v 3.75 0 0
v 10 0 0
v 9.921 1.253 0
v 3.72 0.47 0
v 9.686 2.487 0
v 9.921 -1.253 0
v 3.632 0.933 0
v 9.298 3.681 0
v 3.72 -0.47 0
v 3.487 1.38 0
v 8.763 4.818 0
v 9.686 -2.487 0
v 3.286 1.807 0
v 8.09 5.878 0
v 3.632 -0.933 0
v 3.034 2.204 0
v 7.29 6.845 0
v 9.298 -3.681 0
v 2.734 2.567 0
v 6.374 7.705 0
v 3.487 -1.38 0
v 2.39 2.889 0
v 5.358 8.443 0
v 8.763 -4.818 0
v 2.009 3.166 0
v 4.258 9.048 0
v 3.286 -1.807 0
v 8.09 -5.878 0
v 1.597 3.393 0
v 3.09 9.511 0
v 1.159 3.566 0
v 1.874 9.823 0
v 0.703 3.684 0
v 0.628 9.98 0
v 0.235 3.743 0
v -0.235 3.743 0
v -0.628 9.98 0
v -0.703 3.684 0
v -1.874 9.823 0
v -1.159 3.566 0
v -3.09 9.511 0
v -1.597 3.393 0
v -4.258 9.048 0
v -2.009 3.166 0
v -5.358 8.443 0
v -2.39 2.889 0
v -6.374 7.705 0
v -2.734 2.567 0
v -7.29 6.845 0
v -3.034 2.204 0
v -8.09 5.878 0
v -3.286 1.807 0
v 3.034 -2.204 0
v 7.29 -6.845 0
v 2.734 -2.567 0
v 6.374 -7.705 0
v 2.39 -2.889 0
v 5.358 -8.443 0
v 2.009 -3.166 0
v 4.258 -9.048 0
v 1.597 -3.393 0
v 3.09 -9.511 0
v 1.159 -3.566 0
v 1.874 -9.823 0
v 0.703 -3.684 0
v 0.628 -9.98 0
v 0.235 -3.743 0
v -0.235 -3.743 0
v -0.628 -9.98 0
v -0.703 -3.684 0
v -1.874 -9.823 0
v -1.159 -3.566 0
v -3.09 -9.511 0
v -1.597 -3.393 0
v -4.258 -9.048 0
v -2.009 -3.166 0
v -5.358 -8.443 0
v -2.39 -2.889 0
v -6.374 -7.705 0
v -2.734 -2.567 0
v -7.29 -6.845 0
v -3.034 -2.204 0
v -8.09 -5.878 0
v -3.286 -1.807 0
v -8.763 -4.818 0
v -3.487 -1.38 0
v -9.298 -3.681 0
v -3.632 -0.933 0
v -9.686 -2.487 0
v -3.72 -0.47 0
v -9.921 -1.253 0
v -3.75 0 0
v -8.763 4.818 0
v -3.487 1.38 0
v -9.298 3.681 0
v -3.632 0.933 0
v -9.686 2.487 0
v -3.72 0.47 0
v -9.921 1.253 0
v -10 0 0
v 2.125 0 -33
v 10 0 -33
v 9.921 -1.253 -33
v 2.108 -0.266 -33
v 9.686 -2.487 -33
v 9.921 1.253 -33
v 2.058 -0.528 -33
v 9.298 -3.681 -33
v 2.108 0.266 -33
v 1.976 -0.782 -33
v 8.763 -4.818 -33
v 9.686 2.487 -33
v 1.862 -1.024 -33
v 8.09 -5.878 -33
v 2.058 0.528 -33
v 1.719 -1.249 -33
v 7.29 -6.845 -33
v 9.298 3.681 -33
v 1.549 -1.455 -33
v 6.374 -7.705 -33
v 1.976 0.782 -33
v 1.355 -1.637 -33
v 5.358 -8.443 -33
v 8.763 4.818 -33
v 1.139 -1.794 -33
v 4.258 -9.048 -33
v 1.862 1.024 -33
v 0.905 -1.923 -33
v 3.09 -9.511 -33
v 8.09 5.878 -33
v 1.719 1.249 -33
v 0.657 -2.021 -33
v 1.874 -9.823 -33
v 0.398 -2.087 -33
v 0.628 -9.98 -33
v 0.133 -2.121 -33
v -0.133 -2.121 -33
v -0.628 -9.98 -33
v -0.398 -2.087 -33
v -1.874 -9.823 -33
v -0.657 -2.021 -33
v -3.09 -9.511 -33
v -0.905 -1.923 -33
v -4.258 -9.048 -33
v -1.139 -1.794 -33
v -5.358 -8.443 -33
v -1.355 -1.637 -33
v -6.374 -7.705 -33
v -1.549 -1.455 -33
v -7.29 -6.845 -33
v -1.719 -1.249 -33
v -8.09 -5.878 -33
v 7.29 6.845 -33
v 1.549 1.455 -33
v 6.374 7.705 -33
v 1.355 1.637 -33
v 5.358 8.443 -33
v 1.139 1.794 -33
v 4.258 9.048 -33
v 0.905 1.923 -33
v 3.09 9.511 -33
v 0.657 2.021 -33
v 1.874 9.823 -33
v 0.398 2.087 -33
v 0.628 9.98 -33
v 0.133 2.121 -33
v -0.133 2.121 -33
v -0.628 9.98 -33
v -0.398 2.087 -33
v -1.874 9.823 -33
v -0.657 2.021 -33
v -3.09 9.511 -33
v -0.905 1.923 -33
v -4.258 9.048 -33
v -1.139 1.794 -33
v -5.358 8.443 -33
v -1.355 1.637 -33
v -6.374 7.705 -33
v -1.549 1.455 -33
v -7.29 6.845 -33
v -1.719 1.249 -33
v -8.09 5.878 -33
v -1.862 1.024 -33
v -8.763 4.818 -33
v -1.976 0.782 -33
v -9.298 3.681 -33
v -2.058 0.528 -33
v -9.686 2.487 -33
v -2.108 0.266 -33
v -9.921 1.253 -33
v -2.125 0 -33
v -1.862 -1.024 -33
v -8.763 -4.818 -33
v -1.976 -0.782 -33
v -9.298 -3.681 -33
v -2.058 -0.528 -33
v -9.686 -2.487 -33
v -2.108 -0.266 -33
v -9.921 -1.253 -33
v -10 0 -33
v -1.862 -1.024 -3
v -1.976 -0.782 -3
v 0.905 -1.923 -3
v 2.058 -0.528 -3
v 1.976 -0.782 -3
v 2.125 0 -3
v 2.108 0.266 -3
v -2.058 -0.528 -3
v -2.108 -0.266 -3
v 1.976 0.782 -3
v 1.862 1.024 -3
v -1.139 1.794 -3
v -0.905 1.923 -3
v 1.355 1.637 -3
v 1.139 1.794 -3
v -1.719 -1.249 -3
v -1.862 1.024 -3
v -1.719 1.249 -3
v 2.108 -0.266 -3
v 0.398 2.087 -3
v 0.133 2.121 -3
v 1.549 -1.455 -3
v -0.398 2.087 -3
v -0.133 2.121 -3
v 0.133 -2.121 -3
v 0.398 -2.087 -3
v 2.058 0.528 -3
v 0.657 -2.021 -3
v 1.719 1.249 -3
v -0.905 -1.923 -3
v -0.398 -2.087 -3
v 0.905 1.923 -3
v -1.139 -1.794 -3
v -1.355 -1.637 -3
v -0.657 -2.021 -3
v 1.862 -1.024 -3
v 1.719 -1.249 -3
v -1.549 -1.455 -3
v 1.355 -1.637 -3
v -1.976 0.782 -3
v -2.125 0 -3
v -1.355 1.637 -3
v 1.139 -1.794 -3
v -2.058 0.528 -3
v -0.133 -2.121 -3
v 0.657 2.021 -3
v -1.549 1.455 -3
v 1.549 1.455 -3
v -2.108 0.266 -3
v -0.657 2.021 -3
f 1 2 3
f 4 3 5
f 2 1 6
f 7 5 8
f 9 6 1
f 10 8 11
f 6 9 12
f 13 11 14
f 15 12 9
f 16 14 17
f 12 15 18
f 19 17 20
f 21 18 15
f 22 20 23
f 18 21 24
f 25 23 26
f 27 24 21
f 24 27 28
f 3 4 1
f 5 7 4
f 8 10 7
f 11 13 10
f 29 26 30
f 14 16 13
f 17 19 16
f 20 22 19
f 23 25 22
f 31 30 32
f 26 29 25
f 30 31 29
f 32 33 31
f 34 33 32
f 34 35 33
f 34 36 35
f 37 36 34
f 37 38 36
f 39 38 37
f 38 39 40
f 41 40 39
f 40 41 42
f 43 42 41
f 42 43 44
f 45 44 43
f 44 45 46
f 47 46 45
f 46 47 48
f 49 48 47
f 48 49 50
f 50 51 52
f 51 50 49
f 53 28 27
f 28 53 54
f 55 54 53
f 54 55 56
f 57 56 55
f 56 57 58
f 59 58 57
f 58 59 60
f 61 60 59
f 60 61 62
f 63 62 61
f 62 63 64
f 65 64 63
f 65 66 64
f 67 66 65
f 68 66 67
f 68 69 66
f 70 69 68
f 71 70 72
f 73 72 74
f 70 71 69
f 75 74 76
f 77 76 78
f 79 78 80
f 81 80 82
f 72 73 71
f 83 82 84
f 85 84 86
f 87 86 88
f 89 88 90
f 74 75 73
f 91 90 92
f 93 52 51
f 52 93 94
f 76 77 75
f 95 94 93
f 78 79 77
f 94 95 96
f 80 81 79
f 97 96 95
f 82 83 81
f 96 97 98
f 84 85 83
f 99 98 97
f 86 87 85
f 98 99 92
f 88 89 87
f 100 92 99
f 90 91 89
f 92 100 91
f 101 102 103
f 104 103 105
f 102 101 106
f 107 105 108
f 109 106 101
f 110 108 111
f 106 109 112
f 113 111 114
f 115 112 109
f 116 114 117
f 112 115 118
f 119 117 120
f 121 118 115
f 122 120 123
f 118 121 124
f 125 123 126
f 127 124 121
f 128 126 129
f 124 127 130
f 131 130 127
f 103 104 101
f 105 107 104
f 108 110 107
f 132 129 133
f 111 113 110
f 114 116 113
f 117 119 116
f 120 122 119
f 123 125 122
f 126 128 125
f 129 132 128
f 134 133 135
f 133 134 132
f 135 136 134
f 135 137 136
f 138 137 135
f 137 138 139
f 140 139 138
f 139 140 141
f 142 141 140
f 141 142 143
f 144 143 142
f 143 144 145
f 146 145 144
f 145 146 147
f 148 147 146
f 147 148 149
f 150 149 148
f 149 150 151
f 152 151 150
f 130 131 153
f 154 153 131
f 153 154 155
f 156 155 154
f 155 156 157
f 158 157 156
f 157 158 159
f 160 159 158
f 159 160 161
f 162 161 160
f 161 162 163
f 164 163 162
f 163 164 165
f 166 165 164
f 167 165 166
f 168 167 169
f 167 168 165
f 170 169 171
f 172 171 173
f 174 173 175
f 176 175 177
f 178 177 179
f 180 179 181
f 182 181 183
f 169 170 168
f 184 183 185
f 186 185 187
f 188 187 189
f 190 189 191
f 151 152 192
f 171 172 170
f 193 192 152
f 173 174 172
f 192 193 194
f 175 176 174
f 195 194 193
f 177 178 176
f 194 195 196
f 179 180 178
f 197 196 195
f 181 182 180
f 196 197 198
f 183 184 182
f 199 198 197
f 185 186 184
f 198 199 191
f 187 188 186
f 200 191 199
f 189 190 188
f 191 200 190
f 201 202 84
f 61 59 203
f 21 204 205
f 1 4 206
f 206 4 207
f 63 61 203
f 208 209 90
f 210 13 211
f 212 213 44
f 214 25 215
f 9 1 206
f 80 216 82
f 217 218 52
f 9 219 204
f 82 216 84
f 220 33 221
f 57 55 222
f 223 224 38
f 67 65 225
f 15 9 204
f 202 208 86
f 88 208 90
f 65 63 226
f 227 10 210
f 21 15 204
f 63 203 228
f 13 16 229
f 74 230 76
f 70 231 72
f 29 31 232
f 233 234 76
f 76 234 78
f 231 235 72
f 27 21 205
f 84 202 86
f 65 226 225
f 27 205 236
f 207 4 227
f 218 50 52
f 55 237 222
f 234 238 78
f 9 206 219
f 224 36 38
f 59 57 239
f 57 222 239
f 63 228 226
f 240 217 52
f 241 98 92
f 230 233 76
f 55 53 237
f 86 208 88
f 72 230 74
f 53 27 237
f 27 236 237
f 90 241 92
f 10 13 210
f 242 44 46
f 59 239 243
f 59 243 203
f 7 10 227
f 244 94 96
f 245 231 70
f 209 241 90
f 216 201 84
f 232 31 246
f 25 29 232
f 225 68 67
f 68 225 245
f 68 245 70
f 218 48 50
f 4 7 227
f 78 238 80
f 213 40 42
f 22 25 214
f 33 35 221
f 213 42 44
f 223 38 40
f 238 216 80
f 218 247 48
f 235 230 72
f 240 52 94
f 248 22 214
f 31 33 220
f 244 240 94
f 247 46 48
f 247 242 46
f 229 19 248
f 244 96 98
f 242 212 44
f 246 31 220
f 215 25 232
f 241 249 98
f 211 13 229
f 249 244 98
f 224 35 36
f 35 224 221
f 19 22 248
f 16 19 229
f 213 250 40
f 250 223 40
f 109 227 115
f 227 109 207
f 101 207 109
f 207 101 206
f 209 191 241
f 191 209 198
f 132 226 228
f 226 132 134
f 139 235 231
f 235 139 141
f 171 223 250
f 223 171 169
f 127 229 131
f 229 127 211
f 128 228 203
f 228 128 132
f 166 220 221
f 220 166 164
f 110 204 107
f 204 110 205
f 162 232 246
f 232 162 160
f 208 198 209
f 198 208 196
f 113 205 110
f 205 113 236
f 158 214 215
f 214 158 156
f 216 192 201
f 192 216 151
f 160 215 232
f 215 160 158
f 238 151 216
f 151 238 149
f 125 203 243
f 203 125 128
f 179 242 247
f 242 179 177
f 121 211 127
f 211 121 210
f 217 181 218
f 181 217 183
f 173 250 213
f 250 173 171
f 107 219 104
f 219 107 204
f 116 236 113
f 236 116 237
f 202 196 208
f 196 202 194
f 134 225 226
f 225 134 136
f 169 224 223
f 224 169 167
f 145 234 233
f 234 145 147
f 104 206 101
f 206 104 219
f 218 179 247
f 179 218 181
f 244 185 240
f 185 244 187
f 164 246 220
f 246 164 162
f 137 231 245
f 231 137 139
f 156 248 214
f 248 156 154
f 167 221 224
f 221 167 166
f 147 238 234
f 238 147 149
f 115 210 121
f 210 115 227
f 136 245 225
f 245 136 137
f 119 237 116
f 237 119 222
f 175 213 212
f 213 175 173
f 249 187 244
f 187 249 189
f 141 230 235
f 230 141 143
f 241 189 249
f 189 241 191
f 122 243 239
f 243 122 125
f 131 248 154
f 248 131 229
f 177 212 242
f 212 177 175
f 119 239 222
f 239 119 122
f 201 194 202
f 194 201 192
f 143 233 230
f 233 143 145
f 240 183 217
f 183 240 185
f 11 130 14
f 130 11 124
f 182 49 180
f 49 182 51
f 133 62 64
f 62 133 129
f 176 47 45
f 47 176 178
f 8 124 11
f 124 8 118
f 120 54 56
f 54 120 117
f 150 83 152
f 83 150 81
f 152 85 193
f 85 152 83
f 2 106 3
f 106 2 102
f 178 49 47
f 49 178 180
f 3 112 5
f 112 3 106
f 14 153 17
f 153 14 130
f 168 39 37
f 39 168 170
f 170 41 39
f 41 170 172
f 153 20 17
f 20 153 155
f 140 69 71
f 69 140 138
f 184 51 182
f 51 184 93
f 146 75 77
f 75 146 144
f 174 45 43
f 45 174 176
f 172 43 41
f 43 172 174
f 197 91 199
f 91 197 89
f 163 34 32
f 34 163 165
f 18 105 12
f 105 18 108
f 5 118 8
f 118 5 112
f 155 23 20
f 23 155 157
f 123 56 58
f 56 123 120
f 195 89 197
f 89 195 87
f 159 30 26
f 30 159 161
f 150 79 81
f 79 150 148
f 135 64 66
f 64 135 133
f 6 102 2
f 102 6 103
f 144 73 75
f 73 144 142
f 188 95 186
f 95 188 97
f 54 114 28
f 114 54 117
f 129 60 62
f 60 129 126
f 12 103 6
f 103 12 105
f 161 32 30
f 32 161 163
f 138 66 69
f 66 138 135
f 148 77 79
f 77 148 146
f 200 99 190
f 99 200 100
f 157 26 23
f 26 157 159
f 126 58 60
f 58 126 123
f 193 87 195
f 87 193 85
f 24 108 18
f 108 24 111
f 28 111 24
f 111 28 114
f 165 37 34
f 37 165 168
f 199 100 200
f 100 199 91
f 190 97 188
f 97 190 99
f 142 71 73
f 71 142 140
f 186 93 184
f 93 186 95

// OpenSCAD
$fn = 50;


difference() {
	union() {
		translate(v = [0, 0, -33.0000000000]) {
			cylinder(h = 33, r = 10.0000000000);
		}
		cylinder(h = 0, r = 13.0000000000);
	}
	union() {
		translate(v = [0, 0, 0]) {
			rotate(a = [0, 0, 0]) {
				difference() {
					union() {
						#translate(v = [0, 0, -33.0000000000]) {
							cylinder(h = 33, r = 2.0000000000);
						}
						#translate(v = [0, 0, -3]) {
							cylinder(h = 3, r = 10.0000000000, r1 = 2.1250000000, r2 = 3.7500000000);
						}
						#translate(v = [0, 0, -33.0000000000]) {
							cylinder(h = 33, r = 2.1250000000);
						}
						#translate(v = [0, 0, -33.0000000000]) {
							cylinder(h = 33, r = 2.0000000000);
						}
					}
					union();
				}
			}
		}
	}
}
